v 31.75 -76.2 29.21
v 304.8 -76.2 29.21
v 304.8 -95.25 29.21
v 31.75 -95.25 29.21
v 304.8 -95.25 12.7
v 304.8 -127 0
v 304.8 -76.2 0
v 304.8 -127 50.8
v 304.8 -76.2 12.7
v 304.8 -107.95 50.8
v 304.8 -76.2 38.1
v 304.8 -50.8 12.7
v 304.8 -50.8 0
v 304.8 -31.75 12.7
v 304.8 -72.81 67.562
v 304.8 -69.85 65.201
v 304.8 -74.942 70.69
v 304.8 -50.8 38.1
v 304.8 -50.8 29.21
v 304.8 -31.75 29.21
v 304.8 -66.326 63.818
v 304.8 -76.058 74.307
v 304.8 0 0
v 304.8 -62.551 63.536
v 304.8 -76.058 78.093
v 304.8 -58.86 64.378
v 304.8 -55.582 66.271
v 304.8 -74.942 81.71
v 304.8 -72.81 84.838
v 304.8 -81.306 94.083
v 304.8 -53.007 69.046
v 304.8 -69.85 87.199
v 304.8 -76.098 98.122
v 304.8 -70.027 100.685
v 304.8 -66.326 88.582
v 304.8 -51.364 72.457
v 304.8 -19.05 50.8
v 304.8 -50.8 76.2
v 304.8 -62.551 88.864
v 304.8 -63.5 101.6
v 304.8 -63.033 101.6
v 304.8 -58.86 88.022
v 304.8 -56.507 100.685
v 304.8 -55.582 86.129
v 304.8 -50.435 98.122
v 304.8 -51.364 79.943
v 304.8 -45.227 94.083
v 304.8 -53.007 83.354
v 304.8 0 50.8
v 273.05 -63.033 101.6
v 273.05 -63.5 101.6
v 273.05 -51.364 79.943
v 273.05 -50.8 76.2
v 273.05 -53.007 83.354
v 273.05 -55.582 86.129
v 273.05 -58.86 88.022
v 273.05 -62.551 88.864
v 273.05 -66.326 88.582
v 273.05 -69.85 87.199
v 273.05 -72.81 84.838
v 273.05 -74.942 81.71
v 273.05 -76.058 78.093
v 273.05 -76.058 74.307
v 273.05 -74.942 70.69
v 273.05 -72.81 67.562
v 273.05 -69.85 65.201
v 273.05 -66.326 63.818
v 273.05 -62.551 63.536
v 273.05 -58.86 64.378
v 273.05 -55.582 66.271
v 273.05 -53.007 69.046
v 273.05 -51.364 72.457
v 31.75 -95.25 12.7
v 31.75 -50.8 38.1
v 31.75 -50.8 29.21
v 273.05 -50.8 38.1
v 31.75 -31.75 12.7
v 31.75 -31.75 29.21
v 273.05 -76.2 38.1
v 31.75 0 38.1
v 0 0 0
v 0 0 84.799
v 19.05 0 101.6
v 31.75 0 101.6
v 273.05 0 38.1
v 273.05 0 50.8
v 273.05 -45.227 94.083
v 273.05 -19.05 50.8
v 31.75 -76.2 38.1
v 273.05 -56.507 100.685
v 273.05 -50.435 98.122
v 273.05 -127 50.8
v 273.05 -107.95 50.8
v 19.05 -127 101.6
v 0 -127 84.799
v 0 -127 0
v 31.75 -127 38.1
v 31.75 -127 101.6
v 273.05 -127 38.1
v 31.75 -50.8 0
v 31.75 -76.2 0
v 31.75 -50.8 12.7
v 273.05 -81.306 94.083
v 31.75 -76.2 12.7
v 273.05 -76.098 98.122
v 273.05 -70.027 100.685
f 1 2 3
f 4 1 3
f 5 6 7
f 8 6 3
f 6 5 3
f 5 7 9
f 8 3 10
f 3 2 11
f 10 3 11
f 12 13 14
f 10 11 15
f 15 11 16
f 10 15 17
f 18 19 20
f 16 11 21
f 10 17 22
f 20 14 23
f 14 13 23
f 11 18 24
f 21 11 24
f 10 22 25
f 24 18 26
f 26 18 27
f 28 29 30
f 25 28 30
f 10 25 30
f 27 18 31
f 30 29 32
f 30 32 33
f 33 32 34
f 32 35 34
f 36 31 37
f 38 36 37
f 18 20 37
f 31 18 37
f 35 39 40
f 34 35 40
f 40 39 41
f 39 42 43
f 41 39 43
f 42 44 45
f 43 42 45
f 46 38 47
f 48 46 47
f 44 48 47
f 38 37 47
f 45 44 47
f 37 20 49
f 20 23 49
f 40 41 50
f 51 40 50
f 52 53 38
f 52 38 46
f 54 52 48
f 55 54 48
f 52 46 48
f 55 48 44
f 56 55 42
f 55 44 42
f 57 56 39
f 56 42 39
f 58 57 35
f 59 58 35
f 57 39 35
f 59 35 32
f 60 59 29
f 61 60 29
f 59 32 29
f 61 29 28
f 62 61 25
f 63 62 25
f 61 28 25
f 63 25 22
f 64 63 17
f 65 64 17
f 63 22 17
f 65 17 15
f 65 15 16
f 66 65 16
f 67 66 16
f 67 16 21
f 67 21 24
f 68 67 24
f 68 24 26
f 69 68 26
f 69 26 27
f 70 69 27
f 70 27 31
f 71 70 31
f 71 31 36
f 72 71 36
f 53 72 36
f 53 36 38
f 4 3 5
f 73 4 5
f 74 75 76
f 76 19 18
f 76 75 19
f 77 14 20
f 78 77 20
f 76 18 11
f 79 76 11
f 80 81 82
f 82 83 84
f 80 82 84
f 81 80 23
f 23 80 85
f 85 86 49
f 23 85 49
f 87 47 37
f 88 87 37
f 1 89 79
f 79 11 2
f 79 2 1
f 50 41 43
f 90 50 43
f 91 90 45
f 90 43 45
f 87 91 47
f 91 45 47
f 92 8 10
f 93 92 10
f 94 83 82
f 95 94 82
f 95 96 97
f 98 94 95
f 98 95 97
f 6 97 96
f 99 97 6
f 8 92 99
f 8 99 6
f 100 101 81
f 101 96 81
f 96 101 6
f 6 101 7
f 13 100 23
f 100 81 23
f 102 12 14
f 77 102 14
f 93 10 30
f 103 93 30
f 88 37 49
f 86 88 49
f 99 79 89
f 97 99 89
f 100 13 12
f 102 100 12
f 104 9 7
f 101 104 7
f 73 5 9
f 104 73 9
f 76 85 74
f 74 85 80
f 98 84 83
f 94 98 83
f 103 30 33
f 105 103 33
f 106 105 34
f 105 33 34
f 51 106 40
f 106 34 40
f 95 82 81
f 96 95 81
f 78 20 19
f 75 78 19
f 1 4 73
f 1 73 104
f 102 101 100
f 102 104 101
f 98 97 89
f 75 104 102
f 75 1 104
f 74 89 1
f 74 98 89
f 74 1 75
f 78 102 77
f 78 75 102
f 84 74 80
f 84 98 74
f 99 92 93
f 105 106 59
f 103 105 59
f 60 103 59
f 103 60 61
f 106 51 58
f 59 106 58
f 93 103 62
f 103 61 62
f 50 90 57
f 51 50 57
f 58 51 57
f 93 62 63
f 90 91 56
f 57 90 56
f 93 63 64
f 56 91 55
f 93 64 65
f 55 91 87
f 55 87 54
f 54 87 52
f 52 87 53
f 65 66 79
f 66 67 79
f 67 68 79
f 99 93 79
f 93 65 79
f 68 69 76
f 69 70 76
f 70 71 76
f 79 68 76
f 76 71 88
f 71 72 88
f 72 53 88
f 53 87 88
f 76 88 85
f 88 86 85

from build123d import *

# Parameters (mm, degrees)
F1_DEPTH = 127
F2_R     = 12.7
F3_DEPTH = 50.8
F4_DEPTH = 222.25


with BuildPart() as f1:
    # F0 (on Front) → F1 (new body)
    with BuildSketch(Plane.XZ):
        Polygon((0, 84.799479), (0, 0), (304.8, 0), (304.8, 101.6), (273.05, 101.6), (273.05, 38.1), (31.75, 38.1), (31.75, 101.6), (19.05, 101.6), align=None)
    extrude(amount=F1_DEPTH)

    # F2 (on face) → F3 (cut)
    with BuildSketch(Plane.YZ.offset(304.8)):
        with BuildLine():
            Line((-127, 101.6), (-127, 50.8))
            Line((-127, 50.8), (-107.95, 50.8))
            Line((-107.95, 50.8), (-81.305853, 94.082571))
            ThreePointArc((-81.305853, 94.082571), (-73.145897, 99.601092), (-63.5, 101.6))
            Line((-63.5, 101.6), (-127, 101.6))
        make_face()
        with BuildLine():
            Line((-19.05, 50.8), (0, 50.8))
            Line((0, 50.8), (0, 101.6))
            Line((0, 101.6), (-63.033349, 101.6))
            ThreePointArc((-63.033349, 101.6), (-53.387452, 99.601092), (-45.227496, 94.082571))
            Line((-45.227496, 94.082571), (-19.05, 50.8))
        make_face()
        Polygon((-76.2, 0), (-50.8, 0), (-50.8, 12.7), (-31.75, 12.7), (-31.75, 29.21), (-50.8, 29.21), (-50.8, 38.1), (-76.2, 38.1), (-76.2, 29.21), (-95.25, 29.21), (-95.25, 12.7), (-76.2, 12.7), align=None)
        with Locations((-63.5, 76.2)):
            Circle(F2_R)
    extrude(amount=-F3_DEPTH, mode=Mode.SUBTRACT)

    # F3_face (on face) → F4 (cut)
    with BuildSketch(Plane(origin=(254, -63.5, 19.800455), x_dir=(0, 1, 0), z_dir=(1, 0, 0))):
        Polygon((-12.7, -19.800455), (12.7, -19.800455), (12.7, -7.100455), (31.75, -7.100455), (31.75, 9.409545), (12.7, 9.409545), (12.7, 18.299545), (-12.7, 18.299545), (-12.7, 9.409545), (-31.75, 9.409545), (-31.75, -7.100455), (-12.7, -7.100455), align=None)
    extrude(amount=-F4_DEPTH, mode=Mode.SUBTRACT)


solid = f1.part
